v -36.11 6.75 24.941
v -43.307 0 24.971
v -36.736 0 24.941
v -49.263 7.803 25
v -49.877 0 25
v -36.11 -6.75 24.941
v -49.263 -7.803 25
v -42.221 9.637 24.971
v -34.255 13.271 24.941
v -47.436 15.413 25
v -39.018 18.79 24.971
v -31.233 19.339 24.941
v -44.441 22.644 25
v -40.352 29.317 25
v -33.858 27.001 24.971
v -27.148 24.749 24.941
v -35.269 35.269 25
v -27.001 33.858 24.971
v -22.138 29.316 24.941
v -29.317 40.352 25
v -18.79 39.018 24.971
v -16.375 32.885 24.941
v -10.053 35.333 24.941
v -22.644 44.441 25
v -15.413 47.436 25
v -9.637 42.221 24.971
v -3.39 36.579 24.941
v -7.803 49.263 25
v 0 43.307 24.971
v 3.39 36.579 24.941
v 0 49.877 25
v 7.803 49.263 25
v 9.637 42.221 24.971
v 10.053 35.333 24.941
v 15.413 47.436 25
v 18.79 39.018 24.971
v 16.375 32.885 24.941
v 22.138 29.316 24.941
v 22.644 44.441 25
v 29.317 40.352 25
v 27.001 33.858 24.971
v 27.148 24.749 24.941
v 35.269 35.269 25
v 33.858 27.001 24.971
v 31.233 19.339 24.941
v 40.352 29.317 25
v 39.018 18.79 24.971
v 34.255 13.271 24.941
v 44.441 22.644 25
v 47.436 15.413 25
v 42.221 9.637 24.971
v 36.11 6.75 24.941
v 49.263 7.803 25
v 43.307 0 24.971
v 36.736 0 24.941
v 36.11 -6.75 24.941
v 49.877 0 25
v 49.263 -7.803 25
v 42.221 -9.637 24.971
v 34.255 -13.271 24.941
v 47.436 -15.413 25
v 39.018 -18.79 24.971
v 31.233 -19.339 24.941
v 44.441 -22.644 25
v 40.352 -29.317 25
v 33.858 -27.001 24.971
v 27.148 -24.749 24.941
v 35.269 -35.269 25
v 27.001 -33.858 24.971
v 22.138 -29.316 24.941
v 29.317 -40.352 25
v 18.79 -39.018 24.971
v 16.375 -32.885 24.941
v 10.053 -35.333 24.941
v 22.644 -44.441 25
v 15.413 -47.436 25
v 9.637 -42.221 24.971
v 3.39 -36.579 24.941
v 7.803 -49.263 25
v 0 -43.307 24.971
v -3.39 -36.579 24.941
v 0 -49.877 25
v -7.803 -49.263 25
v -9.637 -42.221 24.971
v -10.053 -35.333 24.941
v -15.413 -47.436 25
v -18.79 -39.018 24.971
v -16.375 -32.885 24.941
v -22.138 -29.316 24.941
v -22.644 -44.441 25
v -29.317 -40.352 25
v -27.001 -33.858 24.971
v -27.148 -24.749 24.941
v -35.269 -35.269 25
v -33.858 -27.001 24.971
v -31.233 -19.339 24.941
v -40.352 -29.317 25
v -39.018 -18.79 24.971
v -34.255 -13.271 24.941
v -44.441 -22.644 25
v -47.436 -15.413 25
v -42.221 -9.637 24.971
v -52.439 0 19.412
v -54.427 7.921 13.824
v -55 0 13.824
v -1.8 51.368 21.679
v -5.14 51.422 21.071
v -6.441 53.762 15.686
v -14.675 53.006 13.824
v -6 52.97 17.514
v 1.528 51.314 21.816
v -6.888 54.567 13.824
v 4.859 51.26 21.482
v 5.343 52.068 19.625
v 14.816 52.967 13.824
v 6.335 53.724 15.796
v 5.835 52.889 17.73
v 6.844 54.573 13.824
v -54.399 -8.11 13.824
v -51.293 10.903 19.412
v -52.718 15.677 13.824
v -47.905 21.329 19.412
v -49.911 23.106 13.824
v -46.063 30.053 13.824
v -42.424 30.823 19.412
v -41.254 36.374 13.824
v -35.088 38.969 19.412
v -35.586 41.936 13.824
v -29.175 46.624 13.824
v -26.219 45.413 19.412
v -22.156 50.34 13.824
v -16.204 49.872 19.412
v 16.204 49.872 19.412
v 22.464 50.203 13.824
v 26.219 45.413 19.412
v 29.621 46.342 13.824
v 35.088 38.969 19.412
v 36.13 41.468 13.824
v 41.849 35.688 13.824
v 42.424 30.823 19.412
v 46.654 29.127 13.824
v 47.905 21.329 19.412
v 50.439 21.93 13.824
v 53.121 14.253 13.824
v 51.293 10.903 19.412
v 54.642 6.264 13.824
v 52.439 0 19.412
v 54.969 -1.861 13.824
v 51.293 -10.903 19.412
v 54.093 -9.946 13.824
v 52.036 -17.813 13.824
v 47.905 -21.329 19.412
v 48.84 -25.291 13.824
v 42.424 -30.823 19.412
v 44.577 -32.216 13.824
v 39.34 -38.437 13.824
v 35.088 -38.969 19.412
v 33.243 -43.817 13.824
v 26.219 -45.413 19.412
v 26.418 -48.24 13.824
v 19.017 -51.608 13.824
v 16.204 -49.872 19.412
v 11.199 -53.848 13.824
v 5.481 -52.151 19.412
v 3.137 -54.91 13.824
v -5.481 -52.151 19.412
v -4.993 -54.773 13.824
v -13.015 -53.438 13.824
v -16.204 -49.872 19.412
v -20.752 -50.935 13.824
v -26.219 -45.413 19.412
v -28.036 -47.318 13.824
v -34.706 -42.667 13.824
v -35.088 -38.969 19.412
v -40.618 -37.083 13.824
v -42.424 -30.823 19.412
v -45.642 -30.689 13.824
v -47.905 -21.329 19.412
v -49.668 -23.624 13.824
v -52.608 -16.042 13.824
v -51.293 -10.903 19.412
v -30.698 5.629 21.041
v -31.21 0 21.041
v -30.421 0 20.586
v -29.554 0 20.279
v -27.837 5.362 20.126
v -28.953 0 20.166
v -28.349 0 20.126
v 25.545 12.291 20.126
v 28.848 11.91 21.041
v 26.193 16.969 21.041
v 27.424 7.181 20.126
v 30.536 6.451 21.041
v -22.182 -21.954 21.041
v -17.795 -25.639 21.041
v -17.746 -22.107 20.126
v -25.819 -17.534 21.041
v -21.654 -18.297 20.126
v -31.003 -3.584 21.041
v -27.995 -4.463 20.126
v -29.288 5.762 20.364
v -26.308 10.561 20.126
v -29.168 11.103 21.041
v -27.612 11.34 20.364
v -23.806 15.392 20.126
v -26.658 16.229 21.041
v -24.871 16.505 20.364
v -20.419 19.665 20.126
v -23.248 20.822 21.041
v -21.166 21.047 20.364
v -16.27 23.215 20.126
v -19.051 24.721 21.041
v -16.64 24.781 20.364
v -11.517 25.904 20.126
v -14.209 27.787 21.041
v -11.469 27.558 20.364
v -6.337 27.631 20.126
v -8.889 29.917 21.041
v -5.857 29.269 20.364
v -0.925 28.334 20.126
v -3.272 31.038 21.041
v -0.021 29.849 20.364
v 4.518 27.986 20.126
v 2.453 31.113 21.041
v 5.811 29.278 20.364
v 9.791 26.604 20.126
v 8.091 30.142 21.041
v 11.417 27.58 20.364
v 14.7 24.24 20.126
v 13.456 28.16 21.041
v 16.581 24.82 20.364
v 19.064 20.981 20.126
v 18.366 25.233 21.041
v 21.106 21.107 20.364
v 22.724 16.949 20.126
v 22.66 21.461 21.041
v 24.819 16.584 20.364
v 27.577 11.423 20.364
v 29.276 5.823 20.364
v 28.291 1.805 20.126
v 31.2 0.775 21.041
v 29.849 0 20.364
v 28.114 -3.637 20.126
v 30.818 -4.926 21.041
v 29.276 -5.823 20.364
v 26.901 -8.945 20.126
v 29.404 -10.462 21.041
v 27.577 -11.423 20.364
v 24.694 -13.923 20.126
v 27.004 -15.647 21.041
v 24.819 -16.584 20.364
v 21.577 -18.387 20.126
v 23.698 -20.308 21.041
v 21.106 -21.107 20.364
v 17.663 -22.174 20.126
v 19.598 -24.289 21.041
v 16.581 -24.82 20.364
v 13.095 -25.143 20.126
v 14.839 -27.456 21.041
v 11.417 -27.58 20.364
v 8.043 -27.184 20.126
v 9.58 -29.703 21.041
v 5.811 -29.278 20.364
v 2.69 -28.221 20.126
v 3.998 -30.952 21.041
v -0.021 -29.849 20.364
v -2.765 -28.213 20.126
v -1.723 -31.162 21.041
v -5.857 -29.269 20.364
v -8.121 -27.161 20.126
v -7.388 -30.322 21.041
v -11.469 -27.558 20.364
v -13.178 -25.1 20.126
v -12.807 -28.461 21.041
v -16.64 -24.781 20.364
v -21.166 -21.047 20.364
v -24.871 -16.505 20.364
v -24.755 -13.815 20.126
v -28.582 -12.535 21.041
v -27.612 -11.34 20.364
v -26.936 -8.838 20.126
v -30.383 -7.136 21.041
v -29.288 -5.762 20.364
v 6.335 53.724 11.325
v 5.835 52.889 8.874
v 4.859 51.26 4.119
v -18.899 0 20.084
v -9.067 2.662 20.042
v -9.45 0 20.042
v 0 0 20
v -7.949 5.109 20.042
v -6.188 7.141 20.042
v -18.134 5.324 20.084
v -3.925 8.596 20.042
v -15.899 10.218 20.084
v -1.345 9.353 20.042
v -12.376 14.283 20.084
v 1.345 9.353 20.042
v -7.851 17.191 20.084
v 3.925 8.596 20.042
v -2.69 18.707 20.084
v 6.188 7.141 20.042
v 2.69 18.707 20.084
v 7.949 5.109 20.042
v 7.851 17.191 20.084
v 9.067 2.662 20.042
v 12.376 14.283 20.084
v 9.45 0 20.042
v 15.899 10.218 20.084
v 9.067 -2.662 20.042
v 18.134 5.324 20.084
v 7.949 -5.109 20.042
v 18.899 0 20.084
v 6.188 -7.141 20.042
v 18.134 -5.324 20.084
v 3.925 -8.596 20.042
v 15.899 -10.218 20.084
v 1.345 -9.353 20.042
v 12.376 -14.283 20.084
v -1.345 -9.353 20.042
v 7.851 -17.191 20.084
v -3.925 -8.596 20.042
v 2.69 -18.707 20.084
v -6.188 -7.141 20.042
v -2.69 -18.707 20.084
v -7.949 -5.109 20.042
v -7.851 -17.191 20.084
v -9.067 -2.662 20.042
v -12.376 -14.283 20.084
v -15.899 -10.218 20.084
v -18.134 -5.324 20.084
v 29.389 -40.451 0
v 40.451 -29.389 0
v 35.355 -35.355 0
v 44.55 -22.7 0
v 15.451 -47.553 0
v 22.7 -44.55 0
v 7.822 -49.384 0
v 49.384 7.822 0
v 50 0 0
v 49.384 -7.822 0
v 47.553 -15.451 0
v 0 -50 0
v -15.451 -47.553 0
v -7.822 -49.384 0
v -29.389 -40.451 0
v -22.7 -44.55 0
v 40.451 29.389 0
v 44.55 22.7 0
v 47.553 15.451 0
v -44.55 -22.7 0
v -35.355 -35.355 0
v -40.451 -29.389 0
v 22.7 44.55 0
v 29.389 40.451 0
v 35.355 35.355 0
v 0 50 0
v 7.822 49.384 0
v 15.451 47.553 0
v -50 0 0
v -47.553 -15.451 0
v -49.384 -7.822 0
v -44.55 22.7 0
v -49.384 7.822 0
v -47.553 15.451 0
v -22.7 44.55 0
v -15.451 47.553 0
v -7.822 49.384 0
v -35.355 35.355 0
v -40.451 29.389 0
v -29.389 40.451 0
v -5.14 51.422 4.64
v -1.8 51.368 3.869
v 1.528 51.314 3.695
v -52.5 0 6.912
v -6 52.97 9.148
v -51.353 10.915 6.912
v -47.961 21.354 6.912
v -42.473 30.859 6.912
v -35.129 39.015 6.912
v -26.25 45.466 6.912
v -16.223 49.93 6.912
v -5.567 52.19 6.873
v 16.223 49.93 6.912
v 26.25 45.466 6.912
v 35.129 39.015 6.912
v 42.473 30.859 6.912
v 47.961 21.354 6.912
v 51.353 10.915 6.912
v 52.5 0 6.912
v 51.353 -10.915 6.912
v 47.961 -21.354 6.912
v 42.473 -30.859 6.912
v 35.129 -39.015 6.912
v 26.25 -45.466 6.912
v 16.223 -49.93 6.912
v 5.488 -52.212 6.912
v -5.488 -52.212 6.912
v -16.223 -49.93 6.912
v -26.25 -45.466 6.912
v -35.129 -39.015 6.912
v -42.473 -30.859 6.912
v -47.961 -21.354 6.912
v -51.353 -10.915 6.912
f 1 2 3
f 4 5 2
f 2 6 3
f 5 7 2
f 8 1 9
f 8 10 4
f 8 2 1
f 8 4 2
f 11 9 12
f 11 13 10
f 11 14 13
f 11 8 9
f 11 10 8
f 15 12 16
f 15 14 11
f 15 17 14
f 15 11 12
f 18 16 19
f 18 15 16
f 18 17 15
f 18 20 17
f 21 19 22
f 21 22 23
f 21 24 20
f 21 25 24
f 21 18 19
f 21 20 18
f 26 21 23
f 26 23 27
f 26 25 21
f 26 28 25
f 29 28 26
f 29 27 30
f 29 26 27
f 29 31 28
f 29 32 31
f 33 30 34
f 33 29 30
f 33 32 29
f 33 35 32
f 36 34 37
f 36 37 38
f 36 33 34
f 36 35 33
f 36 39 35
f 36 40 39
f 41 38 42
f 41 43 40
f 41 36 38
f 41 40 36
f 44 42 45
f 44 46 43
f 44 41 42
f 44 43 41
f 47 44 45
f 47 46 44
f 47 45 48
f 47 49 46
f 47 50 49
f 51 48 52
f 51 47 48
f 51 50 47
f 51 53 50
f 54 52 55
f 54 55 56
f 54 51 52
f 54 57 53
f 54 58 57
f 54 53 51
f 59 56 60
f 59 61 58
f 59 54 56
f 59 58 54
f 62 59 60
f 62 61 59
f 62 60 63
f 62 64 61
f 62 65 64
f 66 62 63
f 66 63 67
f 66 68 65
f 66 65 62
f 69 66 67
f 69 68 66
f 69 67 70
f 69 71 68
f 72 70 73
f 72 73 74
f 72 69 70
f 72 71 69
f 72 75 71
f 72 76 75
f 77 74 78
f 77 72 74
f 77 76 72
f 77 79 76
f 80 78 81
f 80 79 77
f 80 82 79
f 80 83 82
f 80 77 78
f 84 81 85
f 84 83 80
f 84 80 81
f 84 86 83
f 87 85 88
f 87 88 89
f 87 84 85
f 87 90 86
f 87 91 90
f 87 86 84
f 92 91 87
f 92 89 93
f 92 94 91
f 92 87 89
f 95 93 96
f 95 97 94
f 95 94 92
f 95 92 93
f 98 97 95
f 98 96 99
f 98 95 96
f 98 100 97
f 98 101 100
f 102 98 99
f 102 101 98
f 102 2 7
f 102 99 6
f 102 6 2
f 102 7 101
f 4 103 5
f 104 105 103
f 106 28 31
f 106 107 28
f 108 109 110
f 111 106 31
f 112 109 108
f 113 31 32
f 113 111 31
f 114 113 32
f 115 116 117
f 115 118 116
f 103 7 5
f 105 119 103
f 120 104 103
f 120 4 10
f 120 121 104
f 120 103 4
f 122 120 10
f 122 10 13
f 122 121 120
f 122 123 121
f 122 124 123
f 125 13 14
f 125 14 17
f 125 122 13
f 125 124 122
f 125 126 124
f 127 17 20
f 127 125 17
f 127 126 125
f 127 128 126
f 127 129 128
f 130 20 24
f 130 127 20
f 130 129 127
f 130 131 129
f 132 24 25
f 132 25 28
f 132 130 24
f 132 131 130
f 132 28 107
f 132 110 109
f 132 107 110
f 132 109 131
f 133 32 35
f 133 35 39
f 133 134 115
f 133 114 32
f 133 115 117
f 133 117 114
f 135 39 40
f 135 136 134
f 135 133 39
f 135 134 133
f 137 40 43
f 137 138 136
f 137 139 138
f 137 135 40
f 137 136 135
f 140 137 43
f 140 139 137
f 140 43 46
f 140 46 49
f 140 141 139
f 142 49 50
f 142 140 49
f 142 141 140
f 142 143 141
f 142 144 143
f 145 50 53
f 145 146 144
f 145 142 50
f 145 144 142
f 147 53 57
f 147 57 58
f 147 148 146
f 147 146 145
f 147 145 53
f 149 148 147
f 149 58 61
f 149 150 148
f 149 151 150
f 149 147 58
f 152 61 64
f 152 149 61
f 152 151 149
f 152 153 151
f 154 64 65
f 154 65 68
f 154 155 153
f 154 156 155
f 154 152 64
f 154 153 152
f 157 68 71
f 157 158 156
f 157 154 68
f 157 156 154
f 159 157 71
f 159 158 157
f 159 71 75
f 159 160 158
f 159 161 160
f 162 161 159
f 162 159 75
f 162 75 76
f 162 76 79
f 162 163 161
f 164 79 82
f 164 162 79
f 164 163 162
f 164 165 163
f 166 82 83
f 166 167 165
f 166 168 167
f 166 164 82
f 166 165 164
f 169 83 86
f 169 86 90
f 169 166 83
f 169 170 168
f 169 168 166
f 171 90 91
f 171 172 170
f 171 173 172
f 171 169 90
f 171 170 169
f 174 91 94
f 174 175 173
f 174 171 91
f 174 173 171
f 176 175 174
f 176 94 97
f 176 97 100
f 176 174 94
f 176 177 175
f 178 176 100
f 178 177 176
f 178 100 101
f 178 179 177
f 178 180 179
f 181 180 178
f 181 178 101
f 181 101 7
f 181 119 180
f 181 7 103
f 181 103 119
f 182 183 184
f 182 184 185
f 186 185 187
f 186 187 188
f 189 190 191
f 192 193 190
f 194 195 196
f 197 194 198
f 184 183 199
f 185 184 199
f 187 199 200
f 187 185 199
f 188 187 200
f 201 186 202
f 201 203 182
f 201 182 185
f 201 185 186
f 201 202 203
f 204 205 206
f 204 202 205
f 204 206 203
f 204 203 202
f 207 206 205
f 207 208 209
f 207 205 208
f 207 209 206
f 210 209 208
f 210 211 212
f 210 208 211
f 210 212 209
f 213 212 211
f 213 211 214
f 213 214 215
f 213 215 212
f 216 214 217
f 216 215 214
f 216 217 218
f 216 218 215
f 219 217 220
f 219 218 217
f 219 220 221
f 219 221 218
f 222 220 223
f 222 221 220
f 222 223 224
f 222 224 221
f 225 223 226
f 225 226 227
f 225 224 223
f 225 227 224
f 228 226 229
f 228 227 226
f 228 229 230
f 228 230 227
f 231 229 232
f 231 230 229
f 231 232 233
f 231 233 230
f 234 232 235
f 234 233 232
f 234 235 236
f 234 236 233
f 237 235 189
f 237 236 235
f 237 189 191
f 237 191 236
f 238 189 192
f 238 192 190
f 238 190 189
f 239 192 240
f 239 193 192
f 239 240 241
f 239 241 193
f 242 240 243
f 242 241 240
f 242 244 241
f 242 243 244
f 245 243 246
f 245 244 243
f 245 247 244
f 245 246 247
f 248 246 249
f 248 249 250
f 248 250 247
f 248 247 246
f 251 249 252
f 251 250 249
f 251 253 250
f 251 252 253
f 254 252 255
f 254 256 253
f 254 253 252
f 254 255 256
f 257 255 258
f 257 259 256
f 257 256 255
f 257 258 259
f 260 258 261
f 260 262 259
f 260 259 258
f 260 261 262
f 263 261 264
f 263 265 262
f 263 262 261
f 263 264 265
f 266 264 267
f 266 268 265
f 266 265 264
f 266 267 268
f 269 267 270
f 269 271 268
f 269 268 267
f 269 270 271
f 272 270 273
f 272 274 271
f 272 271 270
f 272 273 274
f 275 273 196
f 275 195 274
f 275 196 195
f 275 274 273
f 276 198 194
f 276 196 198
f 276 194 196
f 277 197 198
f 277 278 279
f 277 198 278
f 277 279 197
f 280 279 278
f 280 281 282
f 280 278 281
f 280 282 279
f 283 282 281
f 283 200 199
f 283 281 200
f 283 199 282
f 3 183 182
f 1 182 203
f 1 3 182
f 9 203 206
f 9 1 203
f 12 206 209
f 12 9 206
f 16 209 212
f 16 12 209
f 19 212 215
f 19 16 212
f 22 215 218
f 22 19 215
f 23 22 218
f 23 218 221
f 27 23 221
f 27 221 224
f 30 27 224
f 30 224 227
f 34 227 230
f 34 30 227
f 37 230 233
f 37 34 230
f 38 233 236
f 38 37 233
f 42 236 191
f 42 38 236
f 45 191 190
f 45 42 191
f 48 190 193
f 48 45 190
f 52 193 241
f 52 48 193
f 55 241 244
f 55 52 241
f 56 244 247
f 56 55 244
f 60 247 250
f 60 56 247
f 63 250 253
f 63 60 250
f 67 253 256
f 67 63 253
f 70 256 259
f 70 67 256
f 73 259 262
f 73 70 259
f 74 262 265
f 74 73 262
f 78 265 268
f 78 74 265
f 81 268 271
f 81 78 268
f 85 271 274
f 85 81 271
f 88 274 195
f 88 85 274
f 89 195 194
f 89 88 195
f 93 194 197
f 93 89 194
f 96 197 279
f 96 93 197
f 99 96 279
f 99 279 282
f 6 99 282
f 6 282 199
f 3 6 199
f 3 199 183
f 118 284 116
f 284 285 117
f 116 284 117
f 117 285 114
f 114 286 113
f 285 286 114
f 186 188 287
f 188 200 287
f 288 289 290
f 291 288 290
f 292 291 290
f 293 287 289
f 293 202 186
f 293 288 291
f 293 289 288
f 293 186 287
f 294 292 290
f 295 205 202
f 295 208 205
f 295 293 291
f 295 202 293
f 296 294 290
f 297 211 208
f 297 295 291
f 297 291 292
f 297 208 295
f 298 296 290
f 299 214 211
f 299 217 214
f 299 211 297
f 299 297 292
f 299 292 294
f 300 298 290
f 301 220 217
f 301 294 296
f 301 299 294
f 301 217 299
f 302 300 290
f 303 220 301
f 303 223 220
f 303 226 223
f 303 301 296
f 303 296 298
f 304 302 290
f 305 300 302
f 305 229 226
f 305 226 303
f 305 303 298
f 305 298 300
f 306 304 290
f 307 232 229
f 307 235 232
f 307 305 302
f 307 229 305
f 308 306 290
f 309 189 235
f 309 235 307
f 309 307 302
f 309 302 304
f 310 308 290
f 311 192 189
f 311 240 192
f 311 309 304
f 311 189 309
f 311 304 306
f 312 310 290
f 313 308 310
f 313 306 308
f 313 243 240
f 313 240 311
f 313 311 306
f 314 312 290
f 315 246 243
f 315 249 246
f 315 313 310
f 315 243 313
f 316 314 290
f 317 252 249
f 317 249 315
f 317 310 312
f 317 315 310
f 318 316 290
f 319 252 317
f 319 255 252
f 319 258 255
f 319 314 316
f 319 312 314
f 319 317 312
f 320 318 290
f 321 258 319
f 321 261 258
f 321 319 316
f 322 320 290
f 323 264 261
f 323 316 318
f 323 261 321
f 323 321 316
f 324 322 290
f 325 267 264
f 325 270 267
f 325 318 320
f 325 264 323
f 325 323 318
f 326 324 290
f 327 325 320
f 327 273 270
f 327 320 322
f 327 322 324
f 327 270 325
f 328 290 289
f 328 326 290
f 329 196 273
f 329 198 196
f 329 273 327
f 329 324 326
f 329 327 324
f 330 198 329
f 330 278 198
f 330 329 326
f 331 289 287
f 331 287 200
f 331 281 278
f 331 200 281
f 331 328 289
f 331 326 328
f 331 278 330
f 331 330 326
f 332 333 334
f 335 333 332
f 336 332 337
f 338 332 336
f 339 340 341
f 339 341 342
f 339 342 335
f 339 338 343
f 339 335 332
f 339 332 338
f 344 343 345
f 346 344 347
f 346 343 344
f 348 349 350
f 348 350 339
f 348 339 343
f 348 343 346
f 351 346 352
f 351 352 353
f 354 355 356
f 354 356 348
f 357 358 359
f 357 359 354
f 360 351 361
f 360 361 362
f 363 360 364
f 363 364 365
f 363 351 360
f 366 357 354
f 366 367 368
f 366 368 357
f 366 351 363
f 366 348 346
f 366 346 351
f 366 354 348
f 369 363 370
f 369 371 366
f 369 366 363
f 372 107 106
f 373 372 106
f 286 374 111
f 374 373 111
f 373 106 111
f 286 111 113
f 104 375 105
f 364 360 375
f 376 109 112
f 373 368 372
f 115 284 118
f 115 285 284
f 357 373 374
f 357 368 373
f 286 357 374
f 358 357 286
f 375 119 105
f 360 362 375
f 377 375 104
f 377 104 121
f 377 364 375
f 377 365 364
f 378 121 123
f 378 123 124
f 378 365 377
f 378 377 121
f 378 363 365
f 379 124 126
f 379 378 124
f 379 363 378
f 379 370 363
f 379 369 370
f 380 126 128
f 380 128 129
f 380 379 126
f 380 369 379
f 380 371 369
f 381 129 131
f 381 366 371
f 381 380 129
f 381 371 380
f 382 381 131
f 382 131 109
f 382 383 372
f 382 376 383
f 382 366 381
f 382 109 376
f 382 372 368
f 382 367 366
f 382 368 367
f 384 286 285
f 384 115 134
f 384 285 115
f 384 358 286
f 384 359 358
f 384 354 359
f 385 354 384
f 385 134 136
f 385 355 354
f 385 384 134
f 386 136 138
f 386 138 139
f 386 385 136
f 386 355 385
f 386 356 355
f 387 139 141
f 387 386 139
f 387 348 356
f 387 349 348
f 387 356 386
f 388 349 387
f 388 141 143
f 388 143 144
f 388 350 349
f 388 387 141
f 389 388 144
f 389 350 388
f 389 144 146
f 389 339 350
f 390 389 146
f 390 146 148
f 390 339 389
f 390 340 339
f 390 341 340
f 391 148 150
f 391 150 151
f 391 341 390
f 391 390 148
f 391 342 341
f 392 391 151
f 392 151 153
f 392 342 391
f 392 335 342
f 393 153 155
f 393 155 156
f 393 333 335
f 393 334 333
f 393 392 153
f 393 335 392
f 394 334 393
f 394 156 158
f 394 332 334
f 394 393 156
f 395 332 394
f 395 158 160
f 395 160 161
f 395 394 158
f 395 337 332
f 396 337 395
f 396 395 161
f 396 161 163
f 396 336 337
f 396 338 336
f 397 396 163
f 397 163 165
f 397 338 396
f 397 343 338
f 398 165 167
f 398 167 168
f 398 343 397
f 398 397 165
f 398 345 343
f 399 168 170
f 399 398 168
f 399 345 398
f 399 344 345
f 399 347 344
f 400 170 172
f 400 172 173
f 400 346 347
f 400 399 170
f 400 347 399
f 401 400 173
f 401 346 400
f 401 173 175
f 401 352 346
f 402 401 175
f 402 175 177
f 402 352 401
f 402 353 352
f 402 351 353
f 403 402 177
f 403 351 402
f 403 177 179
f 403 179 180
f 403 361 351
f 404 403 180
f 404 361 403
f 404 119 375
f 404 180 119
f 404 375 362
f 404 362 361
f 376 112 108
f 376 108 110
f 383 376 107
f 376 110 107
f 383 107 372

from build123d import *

# Parameters (mm, degrees)
F2_R     = 5
F5_DEPTH = 25


with BuildPart() as f1:
    # F0 (on Front) → F1 (revolve)
    with BuildSketch(Plane.XZ):
        Polygon((-29.923142, 20.133244), (-36.73585, 24.941483), (-49.877202, 25), (-55, 13.824025), (-50, 0), (0, 0), (0, 20), align=None)
    revolve(axis=Axis((0, 0, 10), (0, 0, -1)))

    # F2
    f2_edges = [f1.edges().sort_by_distance(p)[0] for p in [
        (29.923142, 0, 20.133244),
    ]]
    fillet(f2_edges, radius=F2_R)

    # F4 (on offset) → F5 (cut)
    with BuildSketch(Plane.XY.offset(25)):
        Polygon((9.998686, 59.837915), (5.139713, 68.578074), (-4.858973, 68.740159), (-9.998686, 60.162085), (-5.139713, 51.421926), (4.858973, 51.259841), align=None)
    extrude(amount=-F5_DEPTH, mode=Mode.SUBTRACT)


solid = f1.part
